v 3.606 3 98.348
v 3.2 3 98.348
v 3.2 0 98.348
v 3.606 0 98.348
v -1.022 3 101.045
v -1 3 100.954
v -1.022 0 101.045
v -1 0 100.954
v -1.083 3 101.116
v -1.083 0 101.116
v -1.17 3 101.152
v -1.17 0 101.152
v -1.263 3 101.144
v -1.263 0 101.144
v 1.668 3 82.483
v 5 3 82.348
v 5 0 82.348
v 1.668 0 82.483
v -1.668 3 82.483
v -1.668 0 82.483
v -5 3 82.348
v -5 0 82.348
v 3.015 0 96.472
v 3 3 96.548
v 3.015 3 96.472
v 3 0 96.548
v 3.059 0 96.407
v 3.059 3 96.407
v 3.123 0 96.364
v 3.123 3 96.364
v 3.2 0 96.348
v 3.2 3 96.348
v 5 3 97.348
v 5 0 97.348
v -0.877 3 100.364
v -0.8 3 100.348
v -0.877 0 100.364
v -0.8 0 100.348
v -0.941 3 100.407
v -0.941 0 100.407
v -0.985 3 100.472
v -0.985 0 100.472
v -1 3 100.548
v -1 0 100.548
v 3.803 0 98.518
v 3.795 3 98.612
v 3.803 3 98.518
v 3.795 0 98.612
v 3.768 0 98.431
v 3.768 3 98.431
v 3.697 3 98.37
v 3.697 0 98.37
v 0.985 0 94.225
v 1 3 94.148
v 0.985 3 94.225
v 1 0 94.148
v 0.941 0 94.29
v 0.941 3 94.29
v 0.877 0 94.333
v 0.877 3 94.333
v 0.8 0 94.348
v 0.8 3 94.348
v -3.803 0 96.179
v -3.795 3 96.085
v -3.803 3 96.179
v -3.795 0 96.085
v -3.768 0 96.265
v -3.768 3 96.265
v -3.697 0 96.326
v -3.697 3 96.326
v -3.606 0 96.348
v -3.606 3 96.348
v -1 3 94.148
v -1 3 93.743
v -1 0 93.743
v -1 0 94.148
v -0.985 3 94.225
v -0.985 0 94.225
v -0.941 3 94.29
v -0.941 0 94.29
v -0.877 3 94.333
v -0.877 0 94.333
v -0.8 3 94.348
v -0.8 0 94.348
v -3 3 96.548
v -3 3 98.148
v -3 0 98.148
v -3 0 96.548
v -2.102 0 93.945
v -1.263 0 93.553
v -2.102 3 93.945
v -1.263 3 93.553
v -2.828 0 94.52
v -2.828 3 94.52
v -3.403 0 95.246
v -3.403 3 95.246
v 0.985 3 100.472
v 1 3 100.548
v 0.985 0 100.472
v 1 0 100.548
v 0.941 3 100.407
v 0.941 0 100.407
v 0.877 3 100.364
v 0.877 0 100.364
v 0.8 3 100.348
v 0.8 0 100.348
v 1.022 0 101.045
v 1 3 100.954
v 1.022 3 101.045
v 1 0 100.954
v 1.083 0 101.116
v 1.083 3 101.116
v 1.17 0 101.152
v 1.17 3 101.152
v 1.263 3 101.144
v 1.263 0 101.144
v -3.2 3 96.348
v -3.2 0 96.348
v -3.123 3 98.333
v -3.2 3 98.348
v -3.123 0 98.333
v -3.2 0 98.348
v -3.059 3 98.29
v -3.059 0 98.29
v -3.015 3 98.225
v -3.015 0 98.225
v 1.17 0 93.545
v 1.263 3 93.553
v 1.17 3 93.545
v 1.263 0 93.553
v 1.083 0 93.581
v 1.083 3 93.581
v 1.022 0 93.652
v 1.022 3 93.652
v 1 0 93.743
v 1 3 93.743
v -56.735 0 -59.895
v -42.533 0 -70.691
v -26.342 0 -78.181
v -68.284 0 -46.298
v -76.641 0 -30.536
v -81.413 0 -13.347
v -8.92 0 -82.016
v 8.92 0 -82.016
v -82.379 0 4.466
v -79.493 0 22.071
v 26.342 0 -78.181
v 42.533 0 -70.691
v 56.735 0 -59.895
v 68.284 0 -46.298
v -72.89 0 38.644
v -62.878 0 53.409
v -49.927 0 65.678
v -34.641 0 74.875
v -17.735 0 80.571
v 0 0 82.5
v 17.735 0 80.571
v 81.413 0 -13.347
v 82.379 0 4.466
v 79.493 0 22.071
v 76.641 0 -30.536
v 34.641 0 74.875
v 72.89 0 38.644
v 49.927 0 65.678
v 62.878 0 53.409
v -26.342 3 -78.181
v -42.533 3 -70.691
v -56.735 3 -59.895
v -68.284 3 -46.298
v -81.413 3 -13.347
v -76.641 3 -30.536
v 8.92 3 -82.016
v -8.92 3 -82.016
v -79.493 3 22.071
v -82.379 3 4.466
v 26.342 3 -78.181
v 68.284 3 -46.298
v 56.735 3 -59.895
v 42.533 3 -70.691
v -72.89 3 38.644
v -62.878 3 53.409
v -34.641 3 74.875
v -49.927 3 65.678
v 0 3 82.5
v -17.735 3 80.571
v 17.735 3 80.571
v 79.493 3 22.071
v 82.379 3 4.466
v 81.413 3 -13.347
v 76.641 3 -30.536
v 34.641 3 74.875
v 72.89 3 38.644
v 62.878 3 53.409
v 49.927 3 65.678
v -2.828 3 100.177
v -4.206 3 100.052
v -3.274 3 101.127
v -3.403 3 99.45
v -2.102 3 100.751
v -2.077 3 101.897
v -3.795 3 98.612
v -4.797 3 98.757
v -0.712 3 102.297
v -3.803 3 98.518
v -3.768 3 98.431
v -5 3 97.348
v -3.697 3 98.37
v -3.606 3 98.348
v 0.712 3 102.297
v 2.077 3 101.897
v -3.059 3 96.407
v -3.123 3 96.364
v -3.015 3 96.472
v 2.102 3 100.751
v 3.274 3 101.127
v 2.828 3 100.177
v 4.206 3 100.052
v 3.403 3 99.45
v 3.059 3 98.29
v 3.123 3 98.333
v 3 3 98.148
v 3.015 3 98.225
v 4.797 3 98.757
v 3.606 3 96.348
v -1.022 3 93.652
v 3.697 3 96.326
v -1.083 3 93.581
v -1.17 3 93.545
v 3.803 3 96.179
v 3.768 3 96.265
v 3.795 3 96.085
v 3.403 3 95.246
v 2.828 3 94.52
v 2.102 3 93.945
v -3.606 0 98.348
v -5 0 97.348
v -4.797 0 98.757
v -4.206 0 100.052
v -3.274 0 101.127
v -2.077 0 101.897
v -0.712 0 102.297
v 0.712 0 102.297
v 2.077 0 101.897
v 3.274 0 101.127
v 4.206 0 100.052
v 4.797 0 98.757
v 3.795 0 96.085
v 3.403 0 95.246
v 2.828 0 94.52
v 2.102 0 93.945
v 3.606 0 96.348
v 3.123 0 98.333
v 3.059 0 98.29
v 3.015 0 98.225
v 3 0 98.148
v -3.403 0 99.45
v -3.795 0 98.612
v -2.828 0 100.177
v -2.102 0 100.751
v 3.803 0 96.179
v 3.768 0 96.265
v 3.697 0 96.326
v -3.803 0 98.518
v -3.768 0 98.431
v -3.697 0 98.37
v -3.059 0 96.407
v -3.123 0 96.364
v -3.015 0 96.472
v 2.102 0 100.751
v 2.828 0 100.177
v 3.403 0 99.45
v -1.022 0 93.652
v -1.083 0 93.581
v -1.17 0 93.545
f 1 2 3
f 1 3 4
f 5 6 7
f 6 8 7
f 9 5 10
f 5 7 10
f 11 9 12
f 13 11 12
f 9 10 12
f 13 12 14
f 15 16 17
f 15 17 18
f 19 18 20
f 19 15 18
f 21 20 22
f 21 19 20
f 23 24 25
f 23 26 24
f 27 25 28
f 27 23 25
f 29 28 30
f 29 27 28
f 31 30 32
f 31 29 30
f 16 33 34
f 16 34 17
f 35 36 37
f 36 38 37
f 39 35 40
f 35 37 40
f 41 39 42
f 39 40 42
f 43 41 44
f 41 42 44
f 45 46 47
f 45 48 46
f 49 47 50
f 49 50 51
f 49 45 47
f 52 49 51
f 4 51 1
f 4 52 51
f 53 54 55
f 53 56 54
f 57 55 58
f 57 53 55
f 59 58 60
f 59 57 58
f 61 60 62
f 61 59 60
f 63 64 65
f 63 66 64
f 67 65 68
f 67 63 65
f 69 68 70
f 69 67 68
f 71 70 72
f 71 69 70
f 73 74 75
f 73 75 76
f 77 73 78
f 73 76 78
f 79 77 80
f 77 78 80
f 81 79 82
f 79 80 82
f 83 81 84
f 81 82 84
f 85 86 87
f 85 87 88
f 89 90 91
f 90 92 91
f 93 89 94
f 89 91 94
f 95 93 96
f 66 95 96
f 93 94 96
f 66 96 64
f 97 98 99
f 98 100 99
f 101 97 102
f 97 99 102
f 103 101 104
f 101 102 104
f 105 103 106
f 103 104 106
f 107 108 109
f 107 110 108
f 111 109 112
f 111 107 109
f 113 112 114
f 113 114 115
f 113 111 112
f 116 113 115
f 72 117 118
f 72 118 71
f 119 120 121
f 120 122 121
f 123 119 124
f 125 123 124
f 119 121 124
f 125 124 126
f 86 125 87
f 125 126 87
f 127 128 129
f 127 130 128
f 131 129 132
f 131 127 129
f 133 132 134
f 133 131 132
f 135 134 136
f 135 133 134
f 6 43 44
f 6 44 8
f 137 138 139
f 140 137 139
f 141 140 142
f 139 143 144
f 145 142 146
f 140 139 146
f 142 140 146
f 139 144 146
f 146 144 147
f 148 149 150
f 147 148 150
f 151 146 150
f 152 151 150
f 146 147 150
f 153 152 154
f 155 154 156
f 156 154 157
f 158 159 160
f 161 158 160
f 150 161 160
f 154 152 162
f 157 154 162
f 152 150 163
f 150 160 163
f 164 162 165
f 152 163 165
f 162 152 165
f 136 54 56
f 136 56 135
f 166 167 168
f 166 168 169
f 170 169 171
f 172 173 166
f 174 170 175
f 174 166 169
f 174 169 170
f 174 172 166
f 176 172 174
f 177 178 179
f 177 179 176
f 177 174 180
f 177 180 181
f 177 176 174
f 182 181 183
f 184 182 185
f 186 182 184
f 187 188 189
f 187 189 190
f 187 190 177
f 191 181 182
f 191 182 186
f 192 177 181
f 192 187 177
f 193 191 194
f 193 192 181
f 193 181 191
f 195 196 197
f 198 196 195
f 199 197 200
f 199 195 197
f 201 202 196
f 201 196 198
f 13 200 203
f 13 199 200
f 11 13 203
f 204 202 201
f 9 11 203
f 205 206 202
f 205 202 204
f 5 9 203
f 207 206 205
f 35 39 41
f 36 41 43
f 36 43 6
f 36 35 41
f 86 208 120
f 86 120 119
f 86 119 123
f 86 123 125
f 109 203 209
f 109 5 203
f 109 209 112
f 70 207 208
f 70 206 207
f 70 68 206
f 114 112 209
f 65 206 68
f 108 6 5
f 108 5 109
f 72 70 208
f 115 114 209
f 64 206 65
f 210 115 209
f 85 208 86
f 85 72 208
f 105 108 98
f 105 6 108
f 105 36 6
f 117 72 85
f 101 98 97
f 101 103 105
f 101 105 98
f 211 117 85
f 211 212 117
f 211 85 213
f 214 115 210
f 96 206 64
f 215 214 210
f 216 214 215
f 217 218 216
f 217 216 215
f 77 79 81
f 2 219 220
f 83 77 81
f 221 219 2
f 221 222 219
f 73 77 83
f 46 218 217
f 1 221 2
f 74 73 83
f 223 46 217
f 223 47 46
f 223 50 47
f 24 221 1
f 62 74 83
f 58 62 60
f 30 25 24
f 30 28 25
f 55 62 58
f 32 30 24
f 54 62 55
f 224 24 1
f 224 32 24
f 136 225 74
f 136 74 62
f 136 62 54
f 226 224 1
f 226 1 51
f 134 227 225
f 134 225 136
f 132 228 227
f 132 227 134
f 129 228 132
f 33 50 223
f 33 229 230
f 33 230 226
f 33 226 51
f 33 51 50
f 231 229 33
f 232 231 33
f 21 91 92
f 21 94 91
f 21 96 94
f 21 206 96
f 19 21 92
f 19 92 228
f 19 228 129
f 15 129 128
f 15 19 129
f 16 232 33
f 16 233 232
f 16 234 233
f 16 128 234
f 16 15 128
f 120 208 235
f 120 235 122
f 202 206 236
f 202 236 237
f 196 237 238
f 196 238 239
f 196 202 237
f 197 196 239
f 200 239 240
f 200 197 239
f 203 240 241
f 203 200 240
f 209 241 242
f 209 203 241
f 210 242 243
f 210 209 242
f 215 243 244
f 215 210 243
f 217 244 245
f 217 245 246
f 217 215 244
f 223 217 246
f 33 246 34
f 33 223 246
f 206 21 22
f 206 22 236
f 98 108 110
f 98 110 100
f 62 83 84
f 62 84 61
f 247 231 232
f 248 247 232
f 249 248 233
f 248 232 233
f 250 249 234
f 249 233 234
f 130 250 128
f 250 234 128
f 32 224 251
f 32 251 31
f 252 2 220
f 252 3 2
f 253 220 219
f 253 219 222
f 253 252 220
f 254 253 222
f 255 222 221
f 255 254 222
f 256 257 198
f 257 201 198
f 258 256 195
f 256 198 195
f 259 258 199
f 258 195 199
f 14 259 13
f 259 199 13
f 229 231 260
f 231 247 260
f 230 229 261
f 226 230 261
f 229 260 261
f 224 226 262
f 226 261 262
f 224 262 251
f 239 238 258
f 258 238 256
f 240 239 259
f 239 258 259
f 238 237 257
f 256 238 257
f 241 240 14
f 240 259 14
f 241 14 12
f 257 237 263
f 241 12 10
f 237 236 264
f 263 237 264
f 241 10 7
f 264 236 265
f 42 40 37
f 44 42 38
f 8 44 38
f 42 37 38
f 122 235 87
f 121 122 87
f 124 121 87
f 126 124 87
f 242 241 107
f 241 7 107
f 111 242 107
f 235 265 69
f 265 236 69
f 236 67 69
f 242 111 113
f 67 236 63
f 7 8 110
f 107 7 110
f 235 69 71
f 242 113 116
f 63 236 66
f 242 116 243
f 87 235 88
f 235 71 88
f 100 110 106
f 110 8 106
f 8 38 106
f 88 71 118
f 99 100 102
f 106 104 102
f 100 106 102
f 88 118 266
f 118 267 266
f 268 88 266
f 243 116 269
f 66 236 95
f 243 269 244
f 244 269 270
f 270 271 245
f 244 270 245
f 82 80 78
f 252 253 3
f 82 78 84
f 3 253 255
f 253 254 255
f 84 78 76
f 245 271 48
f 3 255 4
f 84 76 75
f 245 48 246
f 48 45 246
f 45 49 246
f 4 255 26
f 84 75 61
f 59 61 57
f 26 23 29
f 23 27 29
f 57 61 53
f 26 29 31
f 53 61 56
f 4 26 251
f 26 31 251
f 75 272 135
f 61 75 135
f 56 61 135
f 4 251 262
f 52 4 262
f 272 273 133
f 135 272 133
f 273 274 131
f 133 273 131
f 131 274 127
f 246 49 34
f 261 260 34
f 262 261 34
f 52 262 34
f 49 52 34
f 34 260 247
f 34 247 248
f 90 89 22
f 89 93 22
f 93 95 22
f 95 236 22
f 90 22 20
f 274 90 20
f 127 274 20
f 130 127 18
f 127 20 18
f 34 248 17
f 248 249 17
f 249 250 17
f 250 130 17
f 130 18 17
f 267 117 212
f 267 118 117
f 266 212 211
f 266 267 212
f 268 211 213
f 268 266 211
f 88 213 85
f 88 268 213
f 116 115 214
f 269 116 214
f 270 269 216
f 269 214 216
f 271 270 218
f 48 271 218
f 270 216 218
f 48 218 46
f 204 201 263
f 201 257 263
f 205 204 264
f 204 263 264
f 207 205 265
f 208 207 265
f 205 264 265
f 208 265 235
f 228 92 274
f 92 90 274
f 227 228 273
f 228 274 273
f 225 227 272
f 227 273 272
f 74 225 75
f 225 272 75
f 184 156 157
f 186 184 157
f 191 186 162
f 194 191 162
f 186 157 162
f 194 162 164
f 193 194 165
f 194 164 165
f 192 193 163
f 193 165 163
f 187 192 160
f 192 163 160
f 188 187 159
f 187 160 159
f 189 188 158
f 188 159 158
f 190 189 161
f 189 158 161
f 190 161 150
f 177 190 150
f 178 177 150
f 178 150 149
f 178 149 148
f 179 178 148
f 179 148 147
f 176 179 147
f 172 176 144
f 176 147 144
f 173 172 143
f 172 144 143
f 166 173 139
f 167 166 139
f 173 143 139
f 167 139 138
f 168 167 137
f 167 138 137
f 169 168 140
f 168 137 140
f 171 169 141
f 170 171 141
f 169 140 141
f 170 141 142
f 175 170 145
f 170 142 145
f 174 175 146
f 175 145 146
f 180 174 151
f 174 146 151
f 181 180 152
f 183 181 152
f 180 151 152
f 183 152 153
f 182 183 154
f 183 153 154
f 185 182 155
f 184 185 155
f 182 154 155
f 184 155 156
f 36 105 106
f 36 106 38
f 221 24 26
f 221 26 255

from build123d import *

# Parameters (mm, degrees)
SKETCH1_R           = 82.5
BOSS_EXTRUDE1_DEPTH = 3
SKETCH11_R          = 4
BOSS_EXTRUDE8_DEPTH = 3
BOSS_EXTRUDE9_DEPTH = 3
FILLET1_R           = 0.2


with BuildPart() as part:
    # Sketch1 → Boss-Extrude1 (new body)
    with BuildSketch(Plane(origin=(0, 0, 0), x_dir=(1, 0, 0), z_dir=(0, 1, 0))):
        with Locations(Location((0, 0, 0), (0, 0, 270))):
            Circle(SKETCH1_R)
    extrude(amount=BOSS_EXTRUDE1_DEPTH)


with BuildPart() as body_2:
    # Sketch11 → Boss-Extrude8 (new, through all)
    with BuildSketch(Plane(origin=(0, 3, 0), x_dir=(1, 0, 0), z_dir=(0, 1, 0))):
        with BuildLine():
            ThreePointArc((5, -82.34834546), (0, -82.5), (-5, -82.34834546))
            Line((-5, -82.34834546), (-5, -97.34834546))
            ThreePointArc((-5, -97.34834546), (0, -102.34834546), (5, -97.34834546))
            Line((5, -97.34834546), (5, -82.34834546))
        make_face()
        with Locations(Location((0, -97.34834546, 0), (0, 0, 270))):
            Circle(SKETCH11_R, mode=Mode.SUBTRACT)
    extrude(amount=-BOSS_EXTRUDE8_DEPTH)

    # Sketch12 → Boss-Extrude9 (add, through all)
    with BuildSketch(Plane(origin=(0, 3, 0), x_dir=(1, 0, 0), z_dir=(0, 1, 0))):
        with BuildLine():
            Line((-1, -93.475362114), (-1, -94.34834546))
            Line((-1, -94.34834546), (1, -94.34834546))
            Line((1, -94.34834546), (1, -93.475362114))
            ThreePointArc((1, -93.475362114), (0, -93.34834546), (-1, -93.475362114))
        make_face()
        with BuildLine():
            Line((3.872983346, -96.34834546), (3, -96.34834546))
            Line((3, -96.34834546), (3, -98.34834546))
            Line((3, -98.34834546), (3.872983346, -98.34834546))
            ThreePointArc((3.872983346, -98.34834546), (4, -97.34834546), (3.872983346, -96.34834546))
        make_face()
        with BuildLine():
            Line((1, -101.221328806), (1, -100.34834546))
            Line((1, -100.34834546), (-1, -100.34834546))
            Line((-1, -100.34834546), (-1, -101.221328806))
            ThreePointArc((-1, -101.221328806), (0, -101.34834546), (1, -101.221328806))
        make_face()
        with BuildLine():
            Line((-3.872983346, -98.34834546), (-3, -98.34834546))
            Line((-3, -98.34834546), (-3, -96.34834546))
            Line((-3, -96.34834546), (-3.872983346, -96.34834546))
            ThreePointArc((-3.872983346, -96.34834546), (-4, -97.34834546), (-3.872983346, -98.34834546))
        make_face()
    extrude(amount=-BOSS_EXTRUDE9_DEPTH)

    # Fillet1
    fillet1_edges = [body_2.edges().sort_by_distance(p)[0] for p in [
        (-1, 1.5, 93.475362114),
        (1, 1.5, 93.475362114),
        (1, 1.5, 94.34834546),
        (-1, 1.5, 94.34834546),
        (3.872983346, 1.5, 96.34834546),
        (3.872983346, 1.5, 98.34834546),
        (3, 1.5, 98.34834546),
        (3, 1.5, 96.34834546),
        (1, 1.5, 101.221328806),
        (-1, 1.5, 101.221328806),
        (-1, 1.5, 100.34834546),
        (1, 1.5, 100.34834546),
        (-3.872983346, 1.5, 98.34834546),
        (-3.872983346, 1.5, 96.34834546),
        (-3, 1.5, 96.34834546),
        (-3, 1.5, 98.34834546),
    ]]
    fillet(fillet1_edges, radius=FILLET1_R)


solid = Compound([part.part, body_2.part])
